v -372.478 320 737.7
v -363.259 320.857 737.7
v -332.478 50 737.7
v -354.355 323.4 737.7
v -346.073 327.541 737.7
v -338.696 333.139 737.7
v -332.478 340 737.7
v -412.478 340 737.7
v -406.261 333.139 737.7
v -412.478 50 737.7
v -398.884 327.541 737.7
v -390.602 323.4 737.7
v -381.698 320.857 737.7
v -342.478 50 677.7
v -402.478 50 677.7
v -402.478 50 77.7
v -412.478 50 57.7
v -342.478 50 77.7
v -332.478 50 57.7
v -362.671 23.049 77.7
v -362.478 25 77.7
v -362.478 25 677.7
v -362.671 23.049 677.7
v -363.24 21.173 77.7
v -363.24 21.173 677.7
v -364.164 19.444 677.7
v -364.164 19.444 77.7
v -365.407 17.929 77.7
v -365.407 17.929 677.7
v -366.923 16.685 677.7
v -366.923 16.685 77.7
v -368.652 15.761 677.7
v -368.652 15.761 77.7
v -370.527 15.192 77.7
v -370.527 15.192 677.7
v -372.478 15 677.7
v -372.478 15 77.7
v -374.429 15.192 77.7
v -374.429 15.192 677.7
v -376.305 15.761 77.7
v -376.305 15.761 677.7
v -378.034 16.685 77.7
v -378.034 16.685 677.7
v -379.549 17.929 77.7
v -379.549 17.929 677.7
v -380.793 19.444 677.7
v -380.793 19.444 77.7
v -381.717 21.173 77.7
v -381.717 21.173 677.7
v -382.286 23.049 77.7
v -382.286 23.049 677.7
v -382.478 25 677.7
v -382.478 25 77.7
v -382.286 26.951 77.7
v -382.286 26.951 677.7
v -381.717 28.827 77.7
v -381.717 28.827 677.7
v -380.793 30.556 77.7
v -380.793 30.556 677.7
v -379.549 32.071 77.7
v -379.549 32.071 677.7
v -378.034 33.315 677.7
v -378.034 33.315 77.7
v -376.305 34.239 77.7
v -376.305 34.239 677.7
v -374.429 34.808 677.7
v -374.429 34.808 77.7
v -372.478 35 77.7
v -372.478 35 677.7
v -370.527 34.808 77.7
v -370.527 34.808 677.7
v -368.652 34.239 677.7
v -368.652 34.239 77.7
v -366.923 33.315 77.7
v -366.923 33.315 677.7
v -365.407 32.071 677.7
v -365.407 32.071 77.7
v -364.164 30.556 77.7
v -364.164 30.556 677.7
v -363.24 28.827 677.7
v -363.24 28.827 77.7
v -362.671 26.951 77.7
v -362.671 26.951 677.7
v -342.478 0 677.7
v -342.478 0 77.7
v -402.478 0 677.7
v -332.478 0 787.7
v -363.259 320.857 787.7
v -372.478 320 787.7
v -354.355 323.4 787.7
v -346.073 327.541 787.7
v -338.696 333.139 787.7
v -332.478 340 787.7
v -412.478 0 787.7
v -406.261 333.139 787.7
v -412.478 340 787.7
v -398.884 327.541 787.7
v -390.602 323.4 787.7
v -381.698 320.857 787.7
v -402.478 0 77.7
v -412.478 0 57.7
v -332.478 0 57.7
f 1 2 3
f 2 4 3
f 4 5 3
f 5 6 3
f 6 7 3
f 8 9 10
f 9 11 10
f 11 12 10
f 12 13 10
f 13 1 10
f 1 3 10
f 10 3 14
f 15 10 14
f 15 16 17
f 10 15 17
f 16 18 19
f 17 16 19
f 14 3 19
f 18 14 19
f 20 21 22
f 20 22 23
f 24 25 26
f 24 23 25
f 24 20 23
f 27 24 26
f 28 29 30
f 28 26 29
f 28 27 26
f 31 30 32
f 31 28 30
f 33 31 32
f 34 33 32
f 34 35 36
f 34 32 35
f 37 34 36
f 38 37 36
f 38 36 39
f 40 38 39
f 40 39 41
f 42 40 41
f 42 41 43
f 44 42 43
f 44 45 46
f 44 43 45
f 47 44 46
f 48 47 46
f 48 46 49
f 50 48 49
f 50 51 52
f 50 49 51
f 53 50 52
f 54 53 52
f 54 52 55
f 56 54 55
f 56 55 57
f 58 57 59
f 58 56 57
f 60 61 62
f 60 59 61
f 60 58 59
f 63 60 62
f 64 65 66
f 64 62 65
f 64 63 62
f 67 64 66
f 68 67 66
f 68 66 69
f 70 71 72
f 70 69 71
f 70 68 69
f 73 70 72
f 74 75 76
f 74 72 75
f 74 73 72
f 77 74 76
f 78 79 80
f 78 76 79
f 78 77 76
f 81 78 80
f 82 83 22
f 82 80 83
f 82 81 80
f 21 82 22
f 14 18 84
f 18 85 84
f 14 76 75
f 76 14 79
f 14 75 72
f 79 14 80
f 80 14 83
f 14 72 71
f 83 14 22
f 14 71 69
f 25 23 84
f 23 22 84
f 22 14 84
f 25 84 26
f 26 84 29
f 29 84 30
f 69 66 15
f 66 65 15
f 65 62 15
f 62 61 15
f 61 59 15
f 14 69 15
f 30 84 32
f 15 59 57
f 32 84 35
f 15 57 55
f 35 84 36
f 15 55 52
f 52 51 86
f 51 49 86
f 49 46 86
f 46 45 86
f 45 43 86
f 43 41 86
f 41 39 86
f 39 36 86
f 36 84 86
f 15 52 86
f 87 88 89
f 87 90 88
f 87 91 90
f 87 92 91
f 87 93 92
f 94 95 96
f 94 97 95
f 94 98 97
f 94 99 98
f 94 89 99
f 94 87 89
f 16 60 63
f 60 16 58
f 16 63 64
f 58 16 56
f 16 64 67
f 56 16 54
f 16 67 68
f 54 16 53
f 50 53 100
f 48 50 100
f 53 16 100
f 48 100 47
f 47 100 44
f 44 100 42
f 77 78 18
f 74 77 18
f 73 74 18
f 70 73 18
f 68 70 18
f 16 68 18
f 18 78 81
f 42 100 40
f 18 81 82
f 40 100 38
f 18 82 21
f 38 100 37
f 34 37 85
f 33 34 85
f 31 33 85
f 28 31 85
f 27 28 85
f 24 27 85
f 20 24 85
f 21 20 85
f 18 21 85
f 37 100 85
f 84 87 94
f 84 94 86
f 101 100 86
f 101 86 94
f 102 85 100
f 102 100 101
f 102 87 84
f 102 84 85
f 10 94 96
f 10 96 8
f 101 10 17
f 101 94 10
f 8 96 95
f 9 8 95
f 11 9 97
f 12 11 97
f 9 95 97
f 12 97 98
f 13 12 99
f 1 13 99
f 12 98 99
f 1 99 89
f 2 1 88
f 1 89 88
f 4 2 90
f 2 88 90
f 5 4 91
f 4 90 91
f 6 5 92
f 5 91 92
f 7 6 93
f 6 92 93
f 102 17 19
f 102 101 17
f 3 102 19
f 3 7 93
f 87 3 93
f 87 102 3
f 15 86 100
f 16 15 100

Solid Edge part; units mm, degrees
sketch "Sketch1" plane through (0, 0, 0) normal (0, -1, 0) x (1, 0, 0)
  line L0 (-402.4784, 77.6999) -> (-342.4784, 77.6999)
  line L1 (-342.4784, 77.6999) -> (-342.4784, 677.6999)
  line L2 (-342.4784, 677.6999) -> (-402.4784, 677.6999)
  line L3 (-402.4784, 677.6999) -> (-402.4784, 77.6999)
  line L4 (-412.4784, 57.6999) -> (-332.4784, 57.6999)
  line L5 (-332.4784, 57.6999) -> (-332.4784, 787.6999)
  line L6 (-332.4784, 787.6999) -> (-412.4784, 787.6999)
  line L7 (-412.4784, 787.6999) -> (-412.4784, 57.6999)
  dimension "D1" = 600
  dimension "D2" = 60
  dimension "D3" = 80
  dimension "D4" = 730
  dimension "D5" = 20
extrude "Protrusion1" add sketch "Sketch1" against normal blind 50
sketch "Sketch2" plane through (-372.4784, 25, 77.6999) normal (0, 0, 1) x (1, 0, 0)
  circle A0 centre (0, 0) radius 10
extrude "Protrusion2" add sketch "Sketch2" along normal up to surface (600 mm away)
sketch "Sketch3" plane through (-372.4784, 50, 247.6999) normal (0, 1, 0) x (0, 0, 1)
  line L0 (490, -40) -> (540, -40)
  line L1 (540, -40) -> (540, 40)
  line L2 (540, 40) -> (490, 40)
  line L3 (490, 40) -> (490, -40)
  dimension "D1" = 80
  dimension "D2" = 50
  dimension "D3" = 50
extrude "ExtrudedProtrusion_3" add sketch "Sketch3" along normal blind 320
sketch "Sketch4" plane through (-372.4784, 310, 787.6999) normal (0, 0, 1) x (0, 1, 0)
  circle A0 centre (60, 0) radius 50
extrude "Cutout1" cut sketch "Sketch4" against normal through all
